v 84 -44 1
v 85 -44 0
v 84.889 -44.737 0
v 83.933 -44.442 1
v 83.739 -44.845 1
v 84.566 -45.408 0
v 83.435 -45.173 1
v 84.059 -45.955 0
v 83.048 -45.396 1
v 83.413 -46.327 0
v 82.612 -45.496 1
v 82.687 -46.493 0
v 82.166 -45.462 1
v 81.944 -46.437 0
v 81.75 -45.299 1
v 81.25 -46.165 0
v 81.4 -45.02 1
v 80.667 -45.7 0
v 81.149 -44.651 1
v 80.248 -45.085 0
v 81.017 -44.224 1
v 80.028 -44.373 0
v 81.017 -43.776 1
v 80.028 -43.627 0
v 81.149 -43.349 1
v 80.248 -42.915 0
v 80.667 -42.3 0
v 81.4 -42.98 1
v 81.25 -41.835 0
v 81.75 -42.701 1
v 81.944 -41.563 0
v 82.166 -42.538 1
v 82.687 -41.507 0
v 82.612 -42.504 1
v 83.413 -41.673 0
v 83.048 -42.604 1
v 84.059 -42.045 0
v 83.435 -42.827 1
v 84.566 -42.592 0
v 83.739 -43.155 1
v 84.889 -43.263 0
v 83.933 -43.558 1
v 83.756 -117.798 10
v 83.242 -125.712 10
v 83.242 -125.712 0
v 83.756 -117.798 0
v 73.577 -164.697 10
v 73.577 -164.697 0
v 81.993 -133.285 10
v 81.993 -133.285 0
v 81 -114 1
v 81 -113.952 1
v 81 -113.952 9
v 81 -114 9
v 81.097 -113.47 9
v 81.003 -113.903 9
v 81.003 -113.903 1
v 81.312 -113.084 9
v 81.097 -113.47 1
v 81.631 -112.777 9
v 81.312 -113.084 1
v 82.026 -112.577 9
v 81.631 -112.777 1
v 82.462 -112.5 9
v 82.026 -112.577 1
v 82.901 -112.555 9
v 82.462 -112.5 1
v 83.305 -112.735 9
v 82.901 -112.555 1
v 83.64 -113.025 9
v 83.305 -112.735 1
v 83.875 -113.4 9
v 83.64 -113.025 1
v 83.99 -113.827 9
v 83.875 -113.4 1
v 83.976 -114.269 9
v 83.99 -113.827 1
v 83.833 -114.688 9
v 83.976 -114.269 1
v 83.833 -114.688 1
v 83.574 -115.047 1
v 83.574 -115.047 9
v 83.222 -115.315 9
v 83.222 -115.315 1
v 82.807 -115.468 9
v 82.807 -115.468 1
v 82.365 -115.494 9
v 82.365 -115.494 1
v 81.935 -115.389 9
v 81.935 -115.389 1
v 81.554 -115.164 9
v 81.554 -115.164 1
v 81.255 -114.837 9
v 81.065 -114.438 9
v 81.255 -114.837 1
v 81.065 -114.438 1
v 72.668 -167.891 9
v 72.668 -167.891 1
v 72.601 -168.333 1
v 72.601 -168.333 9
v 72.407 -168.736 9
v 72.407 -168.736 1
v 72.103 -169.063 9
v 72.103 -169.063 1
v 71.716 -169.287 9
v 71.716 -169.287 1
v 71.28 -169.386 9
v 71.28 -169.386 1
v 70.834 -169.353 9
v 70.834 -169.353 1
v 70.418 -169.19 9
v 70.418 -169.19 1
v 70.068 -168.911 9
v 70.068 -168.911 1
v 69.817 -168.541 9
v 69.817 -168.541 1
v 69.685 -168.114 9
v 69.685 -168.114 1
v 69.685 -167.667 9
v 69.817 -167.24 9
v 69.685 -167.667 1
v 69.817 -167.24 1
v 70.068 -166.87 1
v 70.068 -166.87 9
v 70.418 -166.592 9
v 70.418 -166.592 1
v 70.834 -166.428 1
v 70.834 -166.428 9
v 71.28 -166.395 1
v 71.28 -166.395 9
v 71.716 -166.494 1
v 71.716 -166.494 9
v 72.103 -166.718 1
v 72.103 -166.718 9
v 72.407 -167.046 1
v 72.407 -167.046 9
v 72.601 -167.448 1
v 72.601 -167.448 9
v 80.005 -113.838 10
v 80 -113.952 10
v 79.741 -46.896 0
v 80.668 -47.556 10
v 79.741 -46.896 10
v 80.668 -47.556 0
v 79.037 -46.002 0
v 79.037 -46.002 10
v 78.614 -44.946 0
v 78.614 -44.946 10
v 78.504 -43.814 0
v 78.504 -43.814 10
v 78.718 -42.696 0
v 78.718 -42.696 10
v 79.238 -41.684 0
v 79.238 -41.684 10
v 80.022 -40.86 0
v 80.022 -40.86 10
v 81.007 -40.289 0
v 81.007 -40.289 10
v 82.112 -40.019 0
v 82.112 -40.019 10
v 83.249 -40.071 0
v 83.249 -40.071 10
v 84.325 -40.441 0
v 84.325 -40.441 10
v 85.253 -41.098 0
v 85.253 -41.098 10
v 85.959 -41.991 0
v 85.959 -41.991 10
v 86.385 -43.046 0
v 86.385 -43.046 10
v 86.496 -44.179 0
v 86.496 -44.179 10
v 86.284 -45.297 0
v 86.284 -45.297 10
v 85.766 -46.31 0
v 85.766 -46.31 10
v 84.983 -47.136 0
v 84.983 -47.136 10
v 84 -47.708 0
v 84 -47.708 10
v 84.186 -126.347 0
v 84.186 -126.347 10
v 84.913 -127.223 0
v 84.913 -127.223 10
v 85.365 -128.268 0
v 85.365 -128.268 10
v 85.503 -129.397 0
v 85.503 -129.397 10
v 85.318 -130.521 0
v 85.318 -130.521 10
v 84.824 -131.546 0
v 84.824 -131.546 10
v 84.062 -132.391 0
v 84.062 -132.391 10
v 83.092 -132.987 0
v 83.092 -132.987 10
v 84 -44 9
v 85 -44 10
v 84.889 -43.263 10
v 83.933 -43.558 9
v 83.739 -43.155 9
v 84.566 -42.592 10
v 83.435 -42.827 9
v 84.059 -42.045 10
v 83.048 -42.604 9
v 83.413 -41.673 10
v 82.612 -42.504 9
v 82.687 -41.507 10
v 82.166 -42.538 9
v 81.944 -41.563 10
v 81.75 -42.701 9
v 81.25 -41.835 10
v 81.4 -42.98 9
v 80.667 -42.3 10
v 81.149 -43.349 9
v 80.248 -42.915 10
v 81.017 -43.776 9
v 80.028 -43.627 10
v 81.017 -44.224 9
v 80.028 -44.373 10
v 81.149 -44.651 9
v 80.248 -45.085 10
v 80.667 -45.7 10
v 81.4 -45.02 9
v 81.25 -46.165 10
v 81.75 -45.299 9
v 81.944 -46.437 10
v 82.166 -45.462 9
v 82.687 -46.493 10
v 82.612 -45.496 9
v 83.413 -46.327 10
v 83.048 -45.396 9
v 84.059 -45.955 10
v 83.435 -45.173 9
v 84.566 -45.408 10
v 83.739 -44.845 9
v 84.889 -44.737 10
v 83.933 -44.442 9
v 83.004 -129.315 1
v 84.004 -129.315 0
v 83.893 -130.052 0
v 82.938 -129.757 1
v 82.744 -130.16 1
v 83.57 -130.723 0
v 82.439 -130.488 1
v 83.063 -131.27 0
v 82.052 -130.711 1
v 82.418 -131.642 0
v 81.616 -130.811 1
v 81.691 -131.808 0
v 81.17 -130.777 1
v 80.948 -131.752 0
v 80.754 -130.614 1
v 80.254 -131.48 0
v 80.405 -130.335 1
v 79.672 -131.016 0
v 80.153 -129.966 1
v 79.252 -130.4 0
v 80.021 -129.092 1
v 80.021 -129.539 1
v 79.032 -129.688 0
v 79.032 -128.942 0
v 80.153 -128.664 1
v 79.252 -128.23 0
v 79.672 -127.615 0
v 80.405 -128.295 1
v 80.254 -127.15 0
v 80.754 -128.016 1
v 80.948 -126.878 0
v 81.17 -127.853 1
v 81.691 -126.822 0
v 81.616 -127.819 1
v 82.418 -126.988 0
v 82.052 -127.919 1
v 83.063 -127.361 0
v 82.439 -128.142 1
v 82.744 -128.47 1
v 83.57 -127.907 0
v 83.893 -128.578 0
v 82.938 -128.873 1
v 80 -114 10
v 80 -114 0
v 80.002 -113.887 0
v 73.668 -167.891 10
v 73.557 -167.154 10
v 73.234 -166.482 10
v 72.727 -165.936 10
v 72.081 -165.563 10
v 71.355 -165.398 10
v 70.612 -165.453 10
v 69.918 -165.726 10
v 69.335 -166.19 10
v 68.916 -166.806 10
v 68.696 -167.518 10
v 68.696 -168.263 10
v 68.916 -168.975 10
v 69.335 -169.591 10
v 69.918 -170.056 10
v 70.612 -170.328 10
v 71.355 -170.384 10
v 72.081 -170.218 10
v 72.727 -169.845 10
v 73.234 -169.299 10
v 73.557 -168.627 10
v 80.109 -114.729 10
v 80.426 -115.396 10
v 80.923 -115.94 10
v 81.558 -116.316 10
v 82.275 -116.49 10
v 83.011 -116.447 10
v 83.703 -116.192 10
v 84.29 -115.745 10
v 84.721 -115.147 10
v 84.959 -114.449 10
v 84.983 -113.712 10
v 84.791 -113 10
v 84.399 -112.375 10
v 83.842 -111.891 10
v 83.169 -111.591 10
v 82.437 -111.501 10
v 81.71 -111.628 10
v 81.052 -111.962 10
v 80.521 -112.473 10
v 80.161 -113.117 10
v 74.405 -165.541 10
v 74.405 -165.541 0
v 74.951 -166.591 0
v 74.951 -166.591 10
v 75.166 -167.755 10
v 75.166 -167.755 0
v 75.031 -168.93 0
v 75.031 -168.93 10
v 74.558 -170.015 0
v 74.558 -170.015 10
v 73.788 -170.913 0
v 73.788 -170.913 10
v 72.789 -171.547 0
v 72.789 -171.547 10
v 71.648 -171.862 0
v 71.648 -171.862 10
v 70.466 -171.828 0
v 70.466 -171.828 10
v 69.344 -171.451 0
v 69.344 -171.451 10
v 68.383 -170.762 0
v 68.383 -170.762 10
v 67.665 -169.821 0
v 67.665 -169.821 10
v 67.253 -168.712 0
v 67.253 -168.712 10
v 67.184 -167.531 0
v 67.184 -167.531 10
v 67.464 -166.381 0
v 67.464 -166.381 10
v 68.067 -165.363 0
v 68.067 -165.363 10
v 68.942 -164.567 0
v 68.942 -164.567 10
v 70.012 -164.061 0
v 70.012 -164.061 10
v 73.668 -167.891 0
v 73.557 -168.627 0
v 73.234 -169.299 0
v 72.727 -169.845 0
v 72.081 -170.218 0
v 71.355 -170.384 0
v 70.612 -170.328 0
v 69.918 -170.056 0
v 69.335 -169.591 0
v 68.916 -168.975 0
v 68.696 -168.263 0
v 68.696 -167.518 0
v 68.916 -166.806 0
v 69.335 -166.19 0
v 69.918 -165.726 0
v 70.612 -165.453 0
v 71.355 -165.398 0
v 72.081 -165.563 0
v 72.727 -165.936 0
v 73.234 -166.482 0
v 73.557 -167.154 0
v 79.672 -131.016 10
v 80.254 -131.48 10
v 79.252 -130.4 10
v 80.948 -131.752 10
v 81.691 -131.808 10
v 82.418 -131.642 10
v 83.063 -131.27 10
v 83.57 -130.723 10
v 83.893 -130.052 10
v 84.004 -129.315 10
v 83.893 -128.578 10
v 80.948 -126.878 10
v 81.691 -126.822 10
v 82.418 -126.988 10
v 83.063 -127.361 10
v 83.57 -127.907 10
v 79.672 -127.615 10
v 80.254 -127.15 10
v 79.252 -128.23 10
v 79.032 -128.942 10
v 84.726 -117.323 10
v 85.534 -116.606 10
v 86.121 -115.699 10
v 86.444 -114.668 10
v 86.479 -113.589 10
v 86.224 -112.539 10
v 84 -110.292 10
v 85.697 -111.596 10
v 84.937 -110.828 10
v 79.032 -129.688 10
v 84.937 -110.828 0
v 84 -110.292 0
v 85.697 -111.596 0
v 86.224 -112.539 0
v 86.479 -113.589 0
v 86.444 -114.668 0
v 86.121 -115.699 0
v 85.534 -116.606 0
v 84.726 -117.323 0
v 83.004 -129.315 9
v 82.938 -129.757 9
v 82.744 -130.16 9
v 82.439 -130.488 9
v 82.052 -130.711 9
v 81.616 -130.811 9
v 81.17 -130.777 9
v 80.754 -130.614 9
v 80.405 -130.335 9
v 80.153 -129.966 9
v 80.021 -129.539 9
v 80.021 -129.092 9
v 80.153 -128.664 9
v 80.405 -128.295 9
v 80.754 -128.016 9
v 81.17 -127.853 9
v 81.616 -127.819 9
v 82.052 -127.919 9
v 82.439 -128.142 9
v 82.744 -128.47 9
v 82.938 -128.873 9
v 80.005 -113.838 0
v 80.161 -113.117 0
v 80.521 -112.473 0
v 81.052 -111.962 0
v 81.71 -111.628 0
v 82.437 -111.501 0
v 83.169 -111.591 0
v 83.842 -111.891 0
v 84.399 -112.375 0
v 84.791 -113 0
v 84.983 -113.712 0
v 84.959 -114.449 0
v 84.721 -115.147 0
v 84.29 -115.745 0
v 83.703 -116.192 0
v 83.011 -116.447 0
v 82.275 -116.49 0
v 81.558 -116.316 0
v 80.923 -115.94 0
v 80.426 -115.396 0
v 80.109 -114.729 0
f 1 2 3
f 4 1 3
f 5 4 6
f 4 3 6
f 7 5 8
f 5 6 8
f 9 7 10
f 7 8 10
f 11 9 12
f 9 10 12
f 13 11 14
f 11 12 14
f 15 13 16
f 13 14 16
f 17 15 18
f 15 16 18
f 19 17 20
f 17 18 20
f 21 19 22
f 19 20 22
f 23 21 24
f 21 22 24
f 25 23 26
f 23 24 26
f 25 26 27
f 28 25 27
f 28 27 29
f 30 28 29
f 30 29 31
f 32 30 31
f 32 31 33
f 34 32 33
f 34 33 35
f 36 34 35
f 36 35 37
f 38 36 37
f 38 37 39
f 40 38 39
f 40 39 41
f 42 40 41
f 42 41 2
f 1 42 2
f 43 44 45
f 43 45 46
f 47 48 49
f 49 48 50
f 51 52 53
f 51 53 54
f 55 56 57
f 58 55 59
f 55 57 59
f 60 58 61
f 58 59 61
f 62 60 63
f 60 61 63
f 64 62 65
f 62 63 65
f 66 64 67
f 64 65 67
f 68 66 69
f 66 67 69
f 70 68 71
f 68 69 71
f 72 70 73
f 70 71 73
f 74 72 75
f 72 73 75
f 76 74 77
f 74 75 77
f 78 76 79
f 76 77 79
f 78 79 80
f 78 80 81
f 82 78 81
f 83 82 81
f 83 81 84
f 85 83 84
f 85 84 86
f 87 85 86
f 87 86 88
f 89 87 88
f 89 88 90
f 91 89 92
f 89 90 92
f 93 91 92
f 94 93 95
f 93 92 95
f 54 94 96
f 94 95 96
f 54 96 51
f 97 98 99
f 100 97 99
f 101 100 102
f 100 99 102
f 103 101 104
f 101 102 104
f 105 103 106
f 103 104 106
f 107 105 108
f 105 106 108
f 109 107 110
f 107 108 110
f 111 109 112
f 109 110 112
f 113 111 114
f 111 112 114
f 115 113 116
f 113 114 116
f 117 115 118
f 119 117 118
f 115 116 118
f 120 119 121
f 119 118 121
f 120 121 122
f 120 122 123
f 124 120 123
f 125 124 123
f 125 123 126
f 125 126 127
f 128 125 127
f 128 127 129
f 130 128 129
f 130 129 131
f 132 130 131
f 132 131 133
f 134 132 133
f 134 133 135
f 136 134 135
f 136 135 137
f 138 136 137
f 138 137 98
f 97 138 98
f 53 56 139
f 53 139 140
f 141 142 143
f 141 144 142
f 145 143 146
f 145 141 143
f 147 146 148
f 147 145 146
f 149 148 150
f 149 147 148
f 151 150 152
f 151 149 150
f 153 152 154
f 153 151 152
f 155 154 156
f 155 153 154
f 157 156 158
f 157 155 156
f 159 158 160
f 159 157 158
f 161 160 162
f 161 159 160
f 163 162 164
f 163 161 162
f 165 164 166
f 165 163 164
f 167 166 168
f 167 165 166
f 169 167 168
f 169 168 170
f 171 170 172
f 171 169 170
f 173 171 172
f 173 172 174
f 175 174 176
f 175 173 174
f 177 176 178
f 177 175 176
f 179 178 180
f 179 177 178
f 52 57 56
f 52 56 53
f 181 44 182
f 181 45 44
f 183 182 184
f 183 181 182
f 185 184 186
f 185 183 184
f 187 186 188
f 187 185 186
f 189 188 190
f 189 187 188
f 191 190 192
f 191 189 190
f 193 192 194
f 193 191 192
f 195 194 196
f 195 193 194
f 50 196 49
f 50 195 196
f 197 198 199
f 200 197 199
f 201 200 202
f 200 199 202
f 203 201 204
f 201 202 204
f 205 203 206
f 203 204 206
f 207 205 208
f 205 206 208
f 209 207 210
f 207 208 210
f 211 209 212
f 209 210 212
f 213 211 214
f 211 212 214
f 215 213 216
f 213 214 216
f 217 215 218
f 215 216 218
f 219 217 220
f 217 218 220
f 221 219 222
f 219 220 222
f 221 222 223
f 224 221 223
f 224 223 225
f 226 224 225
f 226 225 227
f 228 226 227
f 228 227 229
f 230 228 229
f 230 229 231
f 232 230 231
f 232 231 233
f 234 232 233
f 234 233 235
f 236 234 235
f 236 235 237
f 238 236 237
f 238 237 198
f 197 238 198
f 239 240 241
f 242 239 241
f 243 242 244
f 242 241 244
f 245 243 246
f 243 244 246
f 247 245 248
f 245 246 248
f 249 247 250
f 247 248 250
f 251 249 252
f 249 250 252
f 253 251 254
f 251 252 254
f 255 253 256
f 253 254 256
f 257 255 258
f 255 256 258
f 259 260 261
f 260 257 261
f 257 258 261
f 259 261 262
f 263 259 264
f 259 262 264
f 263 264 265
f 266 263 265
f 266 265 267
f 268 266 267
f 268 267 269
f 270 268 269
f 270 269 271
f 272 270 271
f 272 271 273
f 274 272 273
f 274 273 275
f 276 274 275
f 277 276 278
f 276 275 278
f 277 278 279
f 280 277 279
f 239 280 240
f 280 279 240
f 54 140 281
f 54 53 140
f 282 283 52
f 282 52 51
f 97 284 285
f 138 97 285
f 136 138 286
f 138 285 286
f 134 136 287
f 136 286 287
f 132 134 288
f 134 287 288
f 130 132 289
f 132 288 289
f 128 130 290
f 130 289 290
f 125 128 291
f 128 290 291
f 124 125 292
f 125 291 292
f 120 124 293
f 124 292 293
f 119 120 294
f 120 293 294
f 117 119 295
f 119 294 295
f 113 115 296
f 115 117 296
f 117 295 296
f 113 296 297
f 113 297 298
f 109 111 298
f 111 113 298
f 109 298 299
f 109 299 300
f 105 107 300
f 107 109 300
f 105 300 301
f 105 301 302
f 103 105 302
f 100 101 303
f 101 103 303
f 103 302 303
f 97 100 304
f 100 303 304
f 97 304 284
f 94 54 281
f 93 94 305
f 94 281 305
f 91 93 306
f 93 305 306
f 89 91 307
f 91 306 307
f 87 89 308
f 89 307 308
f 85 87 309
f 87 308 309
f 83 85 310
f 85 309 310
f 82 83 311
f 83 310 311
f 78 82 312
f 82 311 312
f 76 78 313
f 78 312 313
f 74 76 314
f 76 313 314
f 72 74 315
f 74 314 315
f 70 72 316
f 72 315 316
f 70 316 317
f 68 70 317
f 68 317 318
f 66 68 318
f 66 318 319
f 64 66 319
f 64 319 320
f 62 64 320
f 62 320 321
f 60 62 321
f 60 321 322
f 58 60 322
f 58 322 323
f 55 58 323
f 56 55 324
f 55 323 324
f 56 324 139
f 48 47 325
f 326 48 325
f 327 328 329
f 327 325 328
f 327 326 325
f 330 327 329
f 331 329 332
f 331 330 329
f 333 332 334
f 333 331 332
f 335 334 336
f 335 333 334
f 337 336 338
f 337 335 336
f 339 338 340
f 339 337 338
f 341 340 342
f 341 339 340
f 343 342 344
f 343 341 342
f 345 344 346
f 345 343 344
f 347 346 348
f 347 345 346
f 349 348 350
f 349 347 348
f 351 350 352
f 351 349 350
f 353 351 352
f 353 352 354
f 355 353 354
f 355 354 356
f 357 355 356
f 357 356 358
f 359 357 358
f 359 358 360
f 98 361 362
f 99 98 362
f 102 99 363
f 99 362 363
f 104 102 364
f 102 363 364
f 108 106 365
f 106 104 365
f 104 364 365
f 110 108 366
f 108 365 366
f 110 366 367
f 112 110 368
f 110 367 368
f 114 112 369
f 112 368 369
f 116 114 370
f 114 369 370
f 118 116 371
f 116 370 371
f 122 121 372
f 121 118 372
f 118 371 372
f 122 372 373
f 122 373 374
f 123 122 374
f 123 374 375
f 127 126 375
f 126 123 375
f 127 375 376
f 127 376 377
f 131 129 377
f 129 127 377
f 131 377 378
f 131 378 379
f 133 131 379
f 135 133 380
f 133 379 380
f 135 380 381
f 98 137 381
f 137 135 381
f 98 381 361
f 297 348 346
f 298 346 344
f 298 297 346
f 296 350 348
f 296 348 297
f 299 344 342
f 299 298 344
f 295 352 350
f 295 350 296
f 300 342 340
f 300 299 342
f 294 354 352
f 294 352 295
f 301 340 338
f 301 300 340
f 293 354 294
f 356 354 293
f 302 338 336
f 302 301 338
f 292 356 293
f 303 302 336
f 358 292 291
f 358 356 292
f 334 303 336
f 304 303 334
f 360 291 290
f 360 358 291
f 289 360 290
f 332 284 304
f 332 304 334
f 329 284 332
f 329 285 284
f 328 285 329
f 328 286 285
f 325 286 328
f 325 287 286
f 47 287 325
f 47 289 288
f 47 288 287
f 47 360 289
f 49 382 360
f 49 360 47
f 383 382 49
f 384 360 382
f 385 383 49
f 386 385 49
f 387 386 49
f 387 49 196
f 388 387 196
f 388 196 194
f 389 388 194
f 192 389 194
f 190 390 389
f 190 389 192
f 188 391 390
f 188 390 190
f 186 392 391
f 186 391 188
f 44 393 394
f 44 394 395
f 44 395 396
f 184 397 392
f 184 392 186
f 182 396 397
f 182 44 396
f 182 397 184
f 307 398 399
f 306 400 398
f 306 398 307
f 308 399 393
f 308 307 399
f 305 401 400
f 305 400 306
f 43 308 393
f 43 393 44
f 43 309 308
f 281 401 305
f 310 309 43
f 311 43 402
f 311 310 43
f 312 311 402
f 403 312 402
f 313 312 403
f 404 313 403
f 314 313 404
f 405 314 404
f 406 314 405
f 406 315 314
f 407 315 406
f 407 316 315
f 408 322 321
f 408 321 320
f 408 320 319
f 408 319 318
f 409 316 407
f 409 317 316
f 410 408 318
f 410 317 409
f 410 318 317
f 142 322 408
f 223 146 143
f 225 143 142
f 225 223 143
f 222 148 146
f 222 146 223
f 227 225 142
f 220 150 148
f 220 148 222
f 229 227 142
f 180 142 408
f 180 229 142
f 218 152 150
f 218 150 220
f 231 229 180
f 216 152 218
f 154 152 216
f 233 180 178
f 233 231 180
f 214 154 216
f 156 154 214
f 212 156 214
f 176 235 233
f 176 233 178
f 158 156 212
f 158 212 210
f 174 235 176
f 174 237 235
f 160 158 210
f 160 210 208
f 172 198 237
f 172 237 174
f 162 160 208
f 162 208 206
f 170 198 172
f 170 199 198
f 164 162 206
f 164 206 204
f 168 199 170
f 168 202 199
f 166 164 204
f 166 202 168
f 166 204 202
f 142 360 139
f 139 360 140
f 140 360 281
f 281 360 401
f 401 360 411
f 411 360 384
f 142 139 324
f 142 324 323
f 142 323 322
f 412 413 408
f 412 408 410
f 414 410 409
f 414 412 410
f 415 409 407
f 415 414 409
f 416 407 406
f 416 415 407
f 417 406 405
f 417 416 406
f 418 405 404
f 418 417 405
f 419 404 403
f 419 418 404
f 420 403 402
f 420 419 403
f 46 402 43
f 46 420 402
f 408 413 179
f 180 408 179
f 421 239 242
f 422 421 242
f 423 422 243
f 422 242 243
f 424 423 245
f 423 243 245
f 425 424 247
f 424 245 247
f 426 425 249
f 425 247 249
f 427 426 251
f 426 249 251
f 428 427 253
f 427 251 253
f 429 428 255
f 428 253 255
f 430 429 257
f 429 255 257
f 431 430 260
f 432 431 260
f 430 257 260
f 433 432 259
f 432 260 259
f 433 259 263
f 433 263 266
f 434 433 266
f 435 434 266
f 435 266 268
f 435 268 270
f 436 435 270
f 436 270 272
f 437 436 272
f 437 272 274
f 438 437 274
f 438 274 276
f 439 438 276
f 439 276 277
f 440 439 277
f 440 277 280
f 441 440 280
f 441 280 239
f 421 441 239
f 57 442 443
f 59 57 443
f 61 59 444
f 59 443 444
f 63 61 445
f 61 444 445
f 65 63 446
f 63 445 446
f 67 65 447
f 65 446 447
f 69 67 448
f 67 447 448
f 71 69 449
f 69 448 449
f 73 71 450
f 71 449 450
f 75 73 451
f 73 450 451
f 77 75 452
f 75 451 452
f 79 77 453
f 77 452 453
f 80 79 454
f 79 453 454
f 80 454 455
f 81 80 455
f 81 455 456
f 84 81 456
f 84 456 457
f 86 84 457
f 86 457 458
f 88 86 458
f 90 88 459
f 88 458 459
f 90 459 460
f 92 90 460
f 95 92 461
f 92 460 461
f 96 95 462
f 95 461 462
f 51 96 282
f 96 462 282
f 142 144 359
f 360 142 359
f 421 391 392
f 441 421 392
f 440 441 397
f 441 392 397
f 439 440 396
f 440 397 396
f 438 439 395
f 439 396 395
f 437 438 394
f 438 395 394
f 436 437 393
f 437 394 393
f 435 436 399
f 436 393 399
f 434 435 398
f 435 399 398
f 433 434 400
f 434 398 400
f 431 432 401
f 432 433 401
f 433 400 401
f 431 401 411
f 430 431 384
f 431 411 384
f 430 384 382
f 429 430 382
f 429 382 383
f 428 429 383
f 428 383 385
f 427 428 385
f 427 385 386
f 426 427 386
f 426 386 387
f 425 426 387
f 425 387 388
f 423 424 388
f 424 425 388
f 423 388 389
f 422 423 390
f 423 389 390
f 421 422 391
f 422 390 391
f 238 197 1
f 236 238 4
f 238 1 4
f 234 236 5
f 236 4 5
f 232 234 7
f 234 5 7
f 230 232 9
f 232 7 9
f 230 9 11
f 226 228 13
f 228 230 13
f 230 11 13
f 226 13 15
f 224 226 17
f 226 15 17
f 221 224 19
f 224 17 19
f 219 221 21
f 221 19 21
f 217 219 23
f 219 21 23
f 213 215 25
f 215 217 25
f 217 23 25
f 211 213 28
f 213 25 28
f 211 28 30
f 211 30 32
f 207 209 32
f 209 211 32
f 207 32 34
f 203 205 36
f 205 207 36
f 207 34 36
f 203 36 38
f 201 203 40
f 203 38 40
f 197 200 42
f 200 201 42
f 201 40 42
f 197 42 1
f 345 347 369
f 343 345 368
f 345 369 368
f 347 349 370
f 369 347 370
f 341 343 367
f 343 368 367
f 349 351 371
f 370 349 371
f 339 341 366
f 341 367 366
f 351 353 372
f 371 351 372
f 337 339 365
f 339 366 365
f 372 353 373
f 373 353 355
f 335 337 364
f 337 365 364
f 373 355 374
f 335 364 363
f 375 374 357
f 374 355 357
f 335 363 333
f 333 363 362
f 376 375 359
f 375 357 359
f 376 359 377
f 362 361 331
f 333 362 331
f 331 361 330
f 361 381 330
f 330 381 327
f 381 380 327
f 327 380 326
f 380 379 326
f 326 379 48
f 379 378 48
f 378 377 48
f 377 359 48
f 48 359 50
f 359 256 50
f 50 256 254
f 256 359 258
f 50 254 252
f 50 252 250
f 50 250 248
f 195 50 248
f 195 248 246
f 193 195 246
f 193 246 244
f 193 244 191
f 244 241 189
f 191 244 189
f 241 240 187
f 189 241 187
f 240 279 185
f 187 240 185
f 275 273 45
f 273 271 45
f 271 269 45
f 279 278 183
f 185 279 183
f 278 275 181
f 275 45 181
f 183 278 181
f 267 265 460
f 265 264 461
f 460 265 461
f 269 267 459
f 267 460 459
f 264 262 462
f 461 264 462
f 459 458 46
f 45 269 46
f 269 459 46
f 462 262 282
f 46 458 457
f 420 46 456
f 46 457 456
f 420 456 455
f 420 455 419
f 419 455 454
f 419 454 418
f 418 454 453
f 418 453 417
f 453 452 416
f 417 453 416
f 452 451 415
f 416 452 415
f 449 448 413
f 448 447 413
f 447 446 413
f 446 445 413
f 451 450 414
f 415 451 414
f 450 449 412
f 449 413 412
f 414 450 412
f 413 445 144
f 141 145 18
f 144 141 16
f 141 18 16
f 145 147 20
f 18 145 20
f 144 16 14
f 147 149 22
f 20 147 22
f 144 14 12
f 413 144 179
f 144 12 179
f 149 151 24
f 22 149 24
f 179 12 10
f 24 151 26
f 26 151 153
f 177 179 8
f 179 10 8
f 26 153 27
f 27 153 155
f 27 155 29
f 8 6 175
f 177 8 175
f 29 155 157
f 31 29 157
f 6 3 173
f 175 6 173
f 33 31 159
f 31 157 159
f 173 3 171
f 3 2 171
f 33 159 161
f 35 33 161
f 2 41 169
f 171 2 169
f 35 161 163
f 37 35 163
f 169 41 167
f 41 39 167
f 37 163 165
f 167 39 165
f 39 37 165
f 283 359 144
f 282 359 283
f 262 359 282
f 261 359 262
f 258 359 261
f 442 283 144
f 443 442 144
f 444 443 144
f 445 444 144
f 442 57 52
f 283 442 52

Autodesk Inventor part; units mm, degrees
ref_plane "YZ Plane" through (0, 0, 0) normal (1, 0, 0) x (0, 1, 0)
ref_plane "XZ Plane" through (0, 0, 0) normal (0, 1, 0) x (-1, 0, 0)
ref_plane "XY Plane" through (0, 0, 0) normal (0, 0, 1) x (1, 0, 0)
sketch "Эскиз1" plane through (0, 0, 0) normal (0, 0, 1) x (1, 0, 0)
  circle A0 centre (82.5, -44) radius 1.5 projected
  circle A1 centre (82.5, -114) radius 1.5 projected
  circle A2 centre (81.5042, -129.3151) radius 1.5 projected
  circle A3 centre (71.168, -167.8906) radius 1.5 projected
  line L0 (82.5, -44) -> (82.5, -114) construction
  line L1 (81, -44) -> (81, -114)
  line L2 (84, -114) -> (84, -44)
  arc A4 (84, -44) -> (81, -44) centre (82.5, -44) ccw
  arc A5 (81, -114) -> (84, -114) centre (82.5, -114) ccw
  line L3 (82.5, -114) -> (81.5042, -129.3151) construction
  line L4 (81.0032, -113.9027) -> (80.0074, -129.2178)
  line L5 (83.001, -129.4125) -> (83.9968, -114.0973)
  arc A6 (83.9968, -114.0973) -> (81.0032, -113.9027) centre (82.5, -114) ccw
  arc A7 (80.0074, -129.2178) -> (83.001, -129.4125) centre (81.5042, -129.3151) ccw
  line L6 (81.5042, -129.3151) -> (71.168, -167.8906) construction
  line L7 (80.0553, -128.9269) -> (69.7191, -167.5023)
  line L8 (72.6168, -168.2788) -> (82.9531, -129.7034)
  arc A8 (82.9531, -129.7034) -> (80.0553, -128.9269) centre (81.5042, -129.3151) ccw
  arc A9 (69.7191, -167.5023) -> (72.6168, -168.2788) centre (71.168, -167.8906) ccw
  line L9 (82.5, -44) -> (71.168, -167.8906) construction
  line L10 (81.0062, -43.8634) -> (69.6742, -167.7539)
  line L11 (72.6617, -168.0272) -> (83.9938, -44.1366)
  arc A10 (83.9938, -44.1366) -> (81.0062, -43.8634) centre (82.5, -44) ccw
  arc A11 (69.6742, -167.7539) -> (72.6617, -168.0272) centre (71.168, -167.8906) ccw
  circle A12 centre (82.5, -44) radius 4
  circle A13 centre (82.5, -114) radius 4
  circle A14 centre (81.5042, -129.3151) radius 4
  circle A15 centre (71.168, -167.8906) radius 4
  point P0 (0, 0)
  point P1 (82.5, -79)
  point P2 (82.0021, -121.6576)
  point P3 (76.3361, -148.6029)
  point P4 (76.834, -105.9453)
  point P5 (84, -47.7081)
  point P6 (80.6685, -47.5561)
  point P7 (70.0119, -164.0613)
  point P8 (73.5766, -164.697)
  point P9 (81.9934, -133.2851)
  point P10 (83.2416, -125.7122)
  point P11 (83.7562, -117.7976)
  point P12 (84, -110.2919)
  dimension "d0" = 1.5
  dimension "d1" = 8
  dimension "d2" = 8
  dimension "d3" = 8
  dimension "d4" = 8
extrude "Выдавливание1" add sketch "Эскиз1" along normal blind 10 contours L2 A12 L11 A0 | A0 L10 A12 L2 | A0 L1 A12 L10 | L11 A12 L1 A0 | L2 A13 L1 L11 A12 | A12 L1 L11 L7 A15 L10 | L11 L1 A12 | A13 L5 A1 L2 | L2 A1 L1 A13 | A15 L7 A3 L10 | L10 A3 L8 A15 | L1 A13 L4 A14 L7 L11 | L1 L4 A13 | A15 L11 A3 L7 | L7 L11 A15 | L7 A14 L8 A15 L11 | L5 A13 L4 A1 | L5 A14 L4 A13 | A3 L11 A15 L8 | A14 L4 L7 | L7 L4 A2 L8 A14 | A14 L8 A2 L5 | L5 A2 L7 L4 A14 | L7 A2 L4
chamfer "Фаска1" distance 1 angle 45 8 edges at (81, -44, 10) (81, -114, 10) (80.0042, -129.3151, 10) (69.668, -167.8906, 10) (80.0042, -129.3151, 0) (81, -114, 0) (81, -44, 0) (69.668, -167.8906, 0)
properties part number "Шаблон2"
